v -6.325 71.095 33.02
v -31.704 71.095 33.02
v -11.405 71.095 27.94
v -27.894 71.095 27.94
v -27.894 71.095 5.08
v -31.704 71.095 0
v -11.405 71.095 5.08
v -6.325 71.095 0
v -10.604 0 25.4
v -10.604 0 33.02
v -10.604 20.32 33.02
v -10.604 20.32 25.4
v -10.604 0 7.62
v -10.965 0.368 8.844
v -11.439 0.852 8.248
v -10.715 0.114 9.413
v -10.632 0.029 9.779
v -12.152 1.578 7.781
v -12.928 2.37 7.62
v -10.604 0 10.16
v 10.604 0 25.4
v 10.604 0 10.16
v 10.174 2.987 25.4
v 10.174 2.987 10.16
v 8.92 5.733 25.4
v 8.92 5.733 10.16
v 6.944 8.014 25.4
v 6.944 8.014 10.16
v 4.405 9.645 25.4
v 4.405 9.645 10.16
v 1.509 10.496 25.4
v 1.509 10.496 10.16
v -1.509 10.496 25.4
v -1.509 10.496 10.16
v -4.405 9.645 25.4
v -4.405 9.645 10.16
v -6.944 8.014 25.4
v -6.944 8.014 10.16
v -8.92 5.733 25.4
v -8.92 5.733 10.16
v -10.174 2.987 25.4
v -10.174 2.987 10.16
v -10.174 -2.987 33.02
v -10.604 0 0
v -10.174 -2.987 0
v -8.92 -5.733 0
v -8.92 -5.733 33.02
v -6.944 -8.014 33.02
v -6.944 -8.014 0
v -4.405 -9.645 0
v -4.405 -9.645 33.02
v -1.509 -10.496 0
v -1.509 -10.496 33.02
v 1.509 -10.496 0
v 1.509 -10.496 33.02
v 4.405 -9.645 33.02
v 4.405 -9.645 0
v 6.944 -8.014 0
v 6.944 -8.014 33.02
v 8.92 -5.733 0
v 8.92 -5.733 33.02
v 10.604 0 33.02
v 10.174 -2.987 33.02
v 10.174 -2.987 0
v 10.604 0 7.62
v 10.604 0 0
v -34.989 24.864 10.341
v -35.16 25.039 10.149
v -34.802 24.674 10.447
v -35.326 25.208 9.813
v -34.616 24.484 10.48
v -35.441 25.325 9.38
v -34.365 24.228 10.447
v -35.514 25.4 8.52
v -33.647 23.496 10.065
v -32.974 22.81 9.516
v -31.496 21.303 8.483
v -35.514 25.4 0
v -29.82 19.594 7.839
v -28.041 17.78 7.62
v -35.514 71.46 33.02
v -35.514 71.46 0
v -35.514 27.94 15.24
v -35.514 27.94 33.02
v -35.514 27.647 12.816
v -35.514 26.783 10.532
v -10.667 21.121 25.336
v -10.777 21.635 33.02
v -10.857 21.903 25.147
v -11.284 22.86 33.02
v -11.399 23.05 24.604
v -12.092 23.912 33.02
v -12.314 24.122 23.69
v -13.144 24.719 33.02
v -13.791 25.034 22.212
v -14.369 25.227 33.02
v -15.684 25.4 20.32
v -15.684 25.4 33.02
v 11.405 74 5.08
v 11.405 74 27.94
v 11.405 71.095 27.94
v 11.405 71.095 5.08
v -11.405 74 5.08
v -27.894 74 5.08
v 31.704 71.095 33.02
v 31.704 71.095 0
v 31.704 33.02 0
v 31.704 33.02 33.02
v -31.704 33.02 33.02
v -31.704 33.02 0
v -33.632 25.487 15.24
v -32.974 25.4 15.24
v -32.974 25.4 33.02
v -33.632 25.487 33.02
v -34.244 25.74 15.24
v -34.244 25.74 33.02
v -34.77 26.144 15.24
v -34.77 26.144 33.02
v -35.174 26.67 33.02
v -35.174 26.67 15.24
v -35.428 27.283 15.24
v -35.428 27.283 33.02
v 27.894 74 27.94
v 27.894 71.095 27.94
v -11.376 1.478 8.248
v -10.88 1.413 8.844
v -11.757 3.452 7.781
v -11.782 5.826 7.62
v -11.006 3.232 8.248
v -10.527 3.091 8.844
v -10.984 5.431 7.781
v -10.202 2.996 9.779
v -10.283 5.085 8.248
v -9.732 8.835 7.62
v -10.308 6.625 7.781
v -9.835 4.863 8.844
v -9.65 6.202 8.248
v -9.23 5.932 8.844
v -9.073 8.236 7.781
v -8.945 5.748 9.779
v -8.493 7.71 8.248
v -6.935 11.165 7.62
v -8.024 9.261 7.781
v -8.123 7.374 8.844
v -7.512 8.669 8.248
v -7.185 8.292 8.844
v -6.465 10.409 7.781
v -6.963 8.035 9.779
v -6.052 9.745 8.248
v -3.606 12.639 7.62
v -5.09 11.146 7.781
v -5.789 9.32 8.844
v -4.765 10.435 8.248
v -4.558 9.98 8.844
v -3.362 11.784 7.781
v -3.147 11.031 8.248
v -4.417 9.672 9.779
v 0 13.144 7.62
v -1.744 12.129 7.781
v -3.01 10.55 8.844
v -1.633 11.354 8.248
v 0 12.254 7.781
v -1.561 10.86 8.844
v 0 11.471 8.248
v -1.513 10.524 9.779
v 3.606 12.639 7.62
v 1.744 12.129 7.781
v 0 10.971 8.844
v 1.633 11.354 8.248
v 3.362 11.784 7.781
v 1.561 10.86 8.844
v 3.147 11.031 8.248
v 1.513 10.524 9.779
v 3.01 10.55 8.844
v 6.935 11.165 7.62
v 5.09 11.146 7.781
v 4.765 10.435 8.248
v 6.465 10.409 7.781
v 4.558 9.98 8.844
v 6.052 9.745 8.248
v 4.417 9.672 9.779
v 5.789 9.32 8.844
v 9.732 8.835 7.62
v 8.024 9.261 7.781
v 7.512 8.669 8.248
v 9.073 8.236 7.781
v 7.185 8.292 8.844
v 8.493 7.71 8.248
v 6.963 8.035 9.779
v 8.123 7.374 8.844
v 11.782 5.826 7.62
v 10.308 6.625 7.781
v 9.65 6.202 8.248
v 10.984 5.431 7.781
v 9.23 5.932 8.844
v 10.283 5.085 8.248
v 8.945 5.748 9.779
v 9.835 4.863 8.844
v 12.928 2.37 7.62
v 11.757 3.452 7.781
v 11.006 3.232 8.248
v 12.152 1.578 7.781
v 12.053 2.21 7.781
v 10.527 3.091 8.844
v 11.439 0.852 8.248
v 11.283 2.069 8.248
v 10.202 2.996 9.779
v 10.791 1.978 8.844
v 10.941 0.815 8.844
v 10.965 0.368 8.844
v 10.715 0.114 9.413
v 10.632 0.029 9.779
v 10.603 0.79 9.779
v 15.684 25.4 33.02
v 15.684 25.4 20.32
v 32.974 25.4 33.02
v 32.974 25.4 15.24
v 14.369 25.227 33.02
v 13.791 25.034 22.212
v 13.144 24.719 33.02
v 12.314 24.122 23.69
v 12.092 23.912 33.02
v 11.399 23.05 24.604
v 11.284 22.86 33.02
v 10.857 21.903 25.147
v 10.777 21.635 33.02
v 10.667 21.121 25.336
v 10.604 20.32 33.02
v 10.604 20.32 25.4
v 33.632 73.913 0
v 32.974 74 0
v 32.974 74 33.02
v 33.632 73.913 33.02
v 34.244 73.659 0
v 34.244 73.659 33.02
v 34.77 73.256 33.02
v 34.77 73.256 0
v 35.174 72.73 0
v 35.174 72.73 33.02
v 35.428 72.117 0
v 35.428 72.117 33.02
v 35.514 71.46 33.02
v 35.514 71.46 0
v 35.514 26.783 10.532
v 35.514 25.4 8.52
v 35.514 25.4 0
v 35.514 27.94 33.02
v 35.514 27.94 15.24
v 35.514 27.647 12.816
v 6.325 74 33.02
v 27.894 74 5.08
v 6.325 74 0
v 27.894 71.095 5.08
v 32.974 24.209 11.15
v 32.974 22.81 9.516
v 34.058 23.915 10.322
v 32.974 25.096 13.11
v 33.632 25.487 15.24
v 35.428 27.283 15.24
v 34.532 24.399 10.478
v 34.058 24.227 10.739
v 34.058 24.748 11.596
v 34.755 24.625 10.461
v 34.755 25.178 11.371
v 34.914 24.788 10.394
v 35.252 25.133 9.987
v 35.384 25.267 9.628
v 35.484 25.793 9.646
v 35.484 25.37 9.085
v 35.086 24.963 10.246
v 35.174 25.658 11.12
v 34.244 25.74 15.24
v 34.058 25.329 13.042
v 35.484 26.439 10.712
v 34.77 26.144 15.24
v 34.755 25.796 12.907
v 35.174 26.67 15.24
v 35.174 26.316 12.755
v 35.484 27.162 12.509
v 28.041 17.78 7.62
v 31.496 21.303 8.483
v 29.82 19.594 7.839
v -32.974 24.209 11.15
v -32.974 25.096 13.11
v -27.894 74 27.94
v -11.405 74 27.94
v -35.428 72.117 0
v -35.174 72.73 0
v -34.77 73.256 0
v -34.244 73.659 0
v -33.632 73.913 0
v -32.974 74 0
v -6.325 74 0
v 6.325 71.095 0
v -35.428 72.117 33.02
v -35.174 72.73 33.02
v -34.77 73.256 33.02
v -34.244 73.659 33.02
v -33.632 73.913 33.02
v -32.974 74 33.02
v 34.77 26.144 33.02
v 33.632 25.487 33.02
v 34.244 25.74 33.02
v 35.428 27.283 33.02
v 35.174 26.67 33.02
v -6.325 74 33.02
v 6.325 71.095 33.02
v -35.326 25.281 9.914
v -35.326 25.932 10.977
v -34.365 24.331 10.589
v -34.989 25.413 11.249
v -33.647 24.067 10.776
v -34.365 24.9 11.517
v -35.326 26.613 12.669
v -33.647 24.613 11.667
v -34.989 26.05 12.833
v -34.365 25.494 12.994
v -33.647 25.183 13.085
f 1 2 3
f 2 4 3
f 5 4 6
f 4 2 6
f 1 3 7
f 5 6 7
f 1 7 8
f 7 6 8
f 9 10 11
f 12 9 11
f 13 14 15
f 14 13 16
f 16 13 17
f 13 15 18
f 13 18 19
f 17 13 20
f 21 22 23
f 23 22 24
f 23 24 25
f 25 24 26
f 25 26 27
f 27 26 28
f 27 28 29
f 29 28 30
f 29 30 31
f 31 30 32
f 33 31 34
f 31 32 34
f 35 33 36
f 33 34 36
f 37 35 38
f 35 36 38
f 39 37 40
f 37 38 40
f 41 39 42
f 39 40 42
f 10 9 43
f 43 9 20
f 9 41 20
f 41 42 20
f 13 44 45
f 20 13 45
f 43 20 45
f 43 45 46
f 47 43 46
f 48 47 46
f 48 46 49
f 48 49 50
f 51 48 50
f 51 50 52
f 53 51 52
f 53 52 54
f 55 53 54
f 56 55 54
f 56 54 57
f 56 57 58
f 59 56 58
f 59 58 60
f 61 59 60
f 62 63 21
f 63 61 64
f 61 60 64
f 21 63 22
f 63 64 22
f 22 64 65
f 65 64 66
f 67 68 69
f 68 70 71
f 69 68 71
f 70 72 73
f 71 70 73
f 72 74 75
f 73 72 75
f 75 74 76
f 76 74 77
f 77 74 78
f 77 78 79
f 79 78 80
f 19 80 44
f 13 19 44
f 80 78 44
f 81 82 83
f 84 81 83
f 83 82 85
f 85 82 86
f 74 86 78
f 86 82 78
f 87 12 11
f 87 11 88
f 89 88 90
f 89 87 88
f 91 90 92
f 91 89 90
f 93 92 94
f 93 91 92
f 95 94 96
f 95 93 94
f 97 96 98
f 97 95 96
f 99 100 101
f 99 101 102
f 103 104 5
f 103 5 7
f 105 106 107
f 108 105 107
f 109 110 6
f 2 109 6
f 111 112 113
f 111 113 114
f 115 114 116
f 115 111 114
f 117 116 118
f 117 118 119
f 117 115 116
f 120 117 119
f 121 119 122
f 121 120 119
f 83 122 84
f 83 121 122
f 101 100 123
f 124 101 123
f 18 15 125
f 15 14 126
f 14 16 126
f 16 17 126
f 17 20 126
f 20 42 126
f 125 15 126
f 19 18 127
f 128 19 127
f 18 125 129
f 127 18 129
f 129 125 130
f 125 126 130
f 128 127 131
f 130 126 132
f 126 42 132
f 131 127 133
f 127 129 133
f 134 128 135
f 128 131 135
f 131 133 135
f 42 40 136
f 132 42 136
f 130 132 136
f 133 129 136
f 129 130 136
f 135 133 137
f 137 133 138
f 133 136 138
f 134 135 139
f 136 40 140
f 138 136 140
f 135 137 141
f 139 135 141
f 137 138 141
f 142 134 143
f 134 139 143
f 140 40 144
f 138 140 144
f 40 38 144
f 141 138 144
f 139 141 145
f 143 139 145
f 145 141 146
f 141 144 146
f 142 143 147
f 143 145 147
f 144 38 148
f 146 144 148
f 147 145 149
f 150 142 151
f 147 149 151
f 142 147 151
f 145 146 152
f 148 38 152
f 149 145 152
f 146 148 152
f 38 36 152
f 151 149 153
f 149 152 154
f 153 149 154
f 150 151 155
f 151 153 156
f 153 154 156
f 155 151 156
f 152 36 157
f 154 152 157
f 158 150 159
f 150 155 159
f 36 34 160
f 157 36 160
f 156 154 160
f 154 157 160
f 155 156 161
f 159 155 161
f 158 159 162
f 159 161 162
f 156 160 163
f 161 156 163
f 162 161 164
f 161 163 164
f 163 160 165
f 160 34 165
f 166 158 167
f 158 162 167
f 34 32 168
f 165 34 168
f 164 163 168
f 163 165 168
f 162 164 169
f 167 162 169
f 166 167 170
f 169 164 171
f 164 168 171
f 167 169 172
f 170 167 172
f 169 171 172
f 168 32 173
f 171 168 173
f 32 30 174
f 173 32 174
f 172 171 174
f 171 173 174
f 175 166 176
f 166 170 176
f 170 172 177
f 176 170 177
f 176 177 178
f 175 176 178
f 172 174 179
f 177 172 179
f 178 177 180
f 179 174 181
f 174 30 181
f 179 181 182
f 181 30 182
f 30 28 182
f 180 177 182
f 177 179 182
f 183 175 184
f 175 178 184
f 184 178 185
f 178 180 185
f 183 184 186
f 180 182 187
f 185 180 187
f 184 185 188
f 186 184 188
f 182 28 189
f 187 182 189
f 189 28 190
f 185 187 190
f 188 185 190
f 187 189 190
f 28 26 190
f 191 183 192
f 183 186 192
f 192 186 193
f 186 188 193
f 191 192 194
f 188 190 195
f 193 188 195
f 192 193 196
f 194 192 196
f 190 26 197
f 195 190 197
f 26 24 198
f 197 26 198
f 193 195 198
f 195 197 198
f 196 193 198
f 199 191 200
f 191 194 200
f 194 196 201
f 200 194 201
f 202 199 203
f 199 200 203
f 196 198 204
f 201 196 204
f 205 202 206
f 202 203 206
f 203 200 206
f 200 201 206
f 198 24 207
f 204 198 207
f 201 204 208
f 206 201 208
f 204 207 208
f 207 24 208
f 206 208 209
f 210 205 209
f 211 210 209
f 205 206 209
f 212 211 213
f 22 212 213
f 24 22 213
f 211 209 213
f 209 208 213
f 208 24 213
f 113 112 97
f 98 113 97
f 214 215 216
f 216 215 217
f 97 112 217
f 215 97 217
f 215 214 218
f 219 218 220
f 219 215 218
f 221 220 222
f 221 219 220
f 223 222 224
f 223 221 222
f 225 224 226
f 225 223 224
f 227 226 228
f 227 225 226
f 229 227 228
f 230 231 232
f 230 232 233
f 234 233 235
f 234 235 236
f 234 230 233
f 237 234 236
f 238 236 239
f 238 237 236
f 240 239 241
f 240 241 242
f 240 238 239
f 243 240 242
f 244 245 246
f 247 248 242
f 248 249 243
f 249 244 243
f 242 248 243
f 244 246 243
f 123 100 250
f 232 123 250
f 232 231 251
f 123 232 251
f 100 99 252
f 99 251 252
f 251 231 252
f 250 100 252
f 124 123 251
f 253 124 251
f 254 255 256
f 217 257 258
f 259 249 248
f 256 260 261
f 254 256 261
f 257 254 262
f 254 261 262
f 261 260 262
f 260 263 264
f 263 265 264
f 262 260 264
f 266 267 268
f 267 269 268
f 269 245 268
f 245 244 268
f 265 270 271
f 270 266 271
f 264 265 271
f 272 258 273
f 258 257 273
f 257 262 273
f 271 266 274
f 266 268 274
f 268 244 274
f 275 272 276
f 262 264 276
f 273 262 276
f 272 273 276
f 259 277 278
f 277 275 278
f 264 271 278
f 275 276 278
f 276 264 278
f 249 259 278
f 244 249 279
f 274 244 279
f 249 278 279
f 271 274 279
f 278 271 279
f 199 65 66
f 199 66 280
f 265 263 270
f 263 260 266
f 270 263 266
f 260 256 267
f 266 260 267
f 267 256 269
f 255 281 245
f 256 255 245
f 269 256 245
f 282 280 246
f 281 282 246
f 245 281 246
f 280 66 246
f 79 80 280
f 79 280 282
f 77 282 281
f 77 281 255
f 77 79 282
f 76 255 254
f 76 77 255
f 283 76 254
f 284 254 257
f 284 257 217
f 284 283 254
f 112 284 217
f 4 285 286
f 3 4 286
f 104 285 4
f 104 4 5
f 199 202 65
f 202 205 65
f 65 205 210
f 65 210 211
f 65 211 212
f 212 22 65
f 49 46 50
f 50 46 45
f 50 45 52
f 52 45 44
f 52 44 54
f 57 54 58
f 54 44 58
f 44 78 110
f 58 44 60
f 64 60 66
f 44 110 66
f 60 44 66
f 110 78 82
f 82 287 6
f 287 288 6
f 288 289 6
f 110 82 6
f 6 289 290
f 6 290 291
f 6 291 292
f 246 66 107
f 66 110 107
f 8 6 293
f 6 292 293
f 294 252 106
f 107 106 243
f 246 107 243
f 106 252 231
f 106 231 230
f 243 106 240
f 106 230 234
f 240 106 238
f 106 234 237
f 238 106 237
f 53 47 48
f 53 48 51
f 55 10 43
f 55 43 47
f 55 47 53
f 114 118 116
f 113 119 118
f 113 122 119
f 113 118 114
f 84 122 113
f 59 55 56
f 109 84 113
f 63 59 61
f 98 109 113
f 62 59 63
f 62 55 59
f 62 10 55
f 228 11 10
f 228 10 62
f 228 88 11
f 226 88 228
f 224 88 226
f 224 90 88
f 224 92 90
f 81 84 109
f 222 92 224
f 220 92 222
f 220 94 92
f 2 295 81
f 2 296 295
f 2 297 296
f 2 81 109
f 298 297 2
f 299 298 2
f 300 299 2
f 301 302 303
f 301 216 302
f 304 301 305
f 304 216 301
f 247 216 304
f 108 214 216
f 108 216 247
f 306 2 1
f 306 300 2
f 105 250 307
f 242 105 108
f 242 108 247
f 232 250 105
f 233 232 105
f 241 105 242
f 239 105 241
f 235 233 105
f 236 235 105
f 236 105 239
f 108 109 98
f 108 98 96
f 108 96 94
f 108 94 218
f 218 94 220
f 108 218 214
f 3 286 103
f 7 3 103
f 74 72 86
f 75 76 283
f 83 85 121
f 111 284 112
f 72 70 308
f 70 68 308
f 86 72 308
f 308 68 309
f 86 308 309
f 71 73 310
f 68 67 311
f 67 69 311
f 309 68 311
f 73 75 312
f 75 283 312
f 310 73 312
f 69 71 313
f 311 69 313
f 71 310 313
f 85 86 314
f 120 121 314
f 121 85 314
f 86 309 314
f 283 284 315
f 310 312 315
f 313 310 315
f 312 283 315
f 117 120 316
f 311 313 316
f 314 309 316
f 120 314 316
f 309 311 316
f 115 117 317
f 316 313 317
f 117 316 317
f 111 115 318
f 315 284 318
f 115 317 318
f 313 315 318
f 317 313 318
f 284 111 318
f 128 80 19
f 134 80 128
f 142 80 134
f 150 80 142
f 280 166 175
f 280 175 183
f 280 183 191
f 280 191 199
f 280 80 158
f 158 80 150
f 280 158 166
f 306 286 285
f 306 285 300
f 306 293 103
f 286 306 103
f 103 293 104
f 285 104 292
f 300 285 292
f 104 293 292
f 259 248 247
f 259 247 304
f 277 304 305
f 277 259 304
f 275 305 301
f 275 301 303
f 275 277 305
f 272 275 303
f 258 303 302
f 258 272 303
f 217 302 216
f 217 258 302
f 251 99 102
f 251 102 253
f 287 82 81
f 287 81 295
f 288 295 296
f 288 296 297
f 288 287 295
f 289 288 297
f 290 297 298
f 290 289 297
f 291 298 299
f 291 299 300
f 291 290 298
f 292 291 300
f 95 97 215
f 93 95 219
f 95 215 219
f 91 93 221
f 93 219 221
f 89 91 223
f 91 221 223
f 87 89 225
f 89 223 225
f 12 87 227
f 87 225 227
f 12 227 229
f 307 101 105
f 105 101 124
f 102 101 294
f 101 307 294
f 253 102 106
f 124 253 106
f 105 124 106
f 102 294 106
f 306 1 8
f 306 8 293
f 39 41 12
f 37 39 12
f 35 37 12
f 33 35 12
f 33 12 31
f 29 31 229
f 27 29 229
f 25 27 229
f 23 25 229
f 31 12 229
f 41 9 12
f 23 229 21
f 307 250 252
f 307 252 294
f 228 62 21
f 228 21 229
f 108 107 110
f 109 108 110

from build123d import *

# Parameters (mm, degrees)
SKETCH1_R             = 10.603707514
BOSS_EXTRUDE1_DEPTH   = 33.02
BOSS_EXTRUDE1_2_DEPTH = 33.02
BOSS_EXTRUDE3_DEPTH   = 7.62
FILLET1_R             = 7.62
FILLET2_START         = 15.24
FILLET2_2_DEPTH       = 18.76
FILLET2_START_2       = -1
FILLET2_3_DEPTH       = 18.231506659
FILLET3_R             = 2.54
SKETCH6_W             = 16.48968
SKETCH6_H             = 22.86
CUT_EXTRUDE1_DEPTH    = 2.905181288
SKETCH7_W             = 21.207415028
SKETCH7_H             = 25.4
BOSS_EXTRUDE4_DEPTH   = 7.62
FILLET4_R             = 5.08


with BuildPart() as part:
    # Sketch1 → Boss-Extrude1 (new body)
    with BuildSketch(Plane.XY):
        Circle(SKETCH1_R)
    extrude(amount=BOSS_EXTRUDE1_DEPTH)



with BuildPart() as body_2:
    # Sketch1 → Boss-Extrude1 2 (new body)
    with BuildSketch(Plane.XY):
        Polygon((-35.51428, 73.999781288), (-35.51428, 25.4), (35.51428, 25.4), (35.51428, 73.999781288), (6.3246, 73.999781288), (6.3246, 71.0946), (31.70428, 71.0946), (31.70428, 33.02), (-31.70428, 33.02), (-31.70428, 71.0946), (-6.3246, 71.0946), (-6.3246, 73.999781288), align=None)
    extrude(amount=BOSS_EXTRUDE1_2_DEPTH)


with BuildPart() as part_1:
    add(part.part)

    add(body_2.part)  # Boss-Extrude3 merges body 2
    # Sketch3 → Boss-Extrude3 (add)
    with BuildSketch(Plane(origin=(0, 0, 0), x_dir=(-1, 0, 0), z_dir=(0, 0, -1))):
        with BuildLine():
            Line((-10.603707514, 0), (-35.51428, 25.4))
            Line((-35.51428, 25.4), (35.51428, 25.4))
            Line((35.51428, 25.4), (10.603707514, 0))
            ThreePointArc((10.603707514, 0), (0, -10.603707514), (-10.603707514, 0))
        make_face()
    extrude(amount=-BOSS_EXTRUDE3_DEPTH)

    # Fillet1
    fillet1_edges = [part_1.edges().sort_by_distance(p)[0] for p in [
        (0, 25.4, 7.62),
    ]]
    fillet(fillet1_edges, radius=FILLET1_R)

    # Fillet2: read off the stored shape, not the designer's step
    # Fillet2 outline → Fillet2 (revolve, cut)
    with BuildSketch(Plane(origin=(0, 17.78, 15.24), x_dir=(0, 1, 0), z_dir=(0, 0, -1))):
        with BuildLine():
            ThreePointArc((10.16, -35.51428), (8.363948776, -34.770331224), (7.62, -32.97428))
            Line((7.62, -32.97428), (7.62, -35.51428))
            Line((7.62, -35.51428), (10.16, -35.51428))
        make_face()
        with BuildLine():
            Line((7.62, 35.51428), (7.62, 32.97428))
            ThreePointArc((7.62, 32.97428), (8.363948776, 34.770331224), (10.16, 35.51428))
            Line((10.16, 35.51428), (7.62, 35.51428))
        make_face()
    revolve(axis=Axis((0, 17.78, 15.24), (1, 0, 0)), mode=Mode.SUBTRACT)

    # Fillet2 2 outline → Fillet2 2 (cut)
    with BuildSketch(Plane.XY.offset(FILLET2_START)):
        with BuildLine():
            Line((-35.51428, 73.999781288), (-35.51428, 71.459781288))
            ThreePointArc((-35.51428, 71.459781288), (-34.770331224, 73.255832512), (-32.97428, 73.999781288))
            Line((-32.97428, 73.999781288), (-35.51428, 73.999781288))
        make_face()
        with BuildLine():
            ThreePointArc((32.97428, 73.999781288), (34.770331224, 73.255832512), (35.51428, 71.459781288))
            Line((35.51428, 71.459781288), (35.51428, 73.999781288))
            Line((35.51428, 73.999781288), (32.97428, 73.999781288))
        make_face()
        with BuildLine():
            ThreePointArc((35.51428, 27.94), (34.770331224, 26.143948776), (32.97428, 25.4))
            Line((32.97428, 25.4), (35.51428, 25.4))
            Line((35.51428, 25.4), (35.51428, 27.94))
        make_face()
        with BuildLine():
            ThreePointArc((-32.97428, 25.4), (-34.770331224, 26.143948776), (-35.51428, 27.94))
            Line((-35.51428, 27.94), (-35.51428, 25.4))
            Line((-35.51428, 25.4), (-32.97428, 25.4))
        make_face()
    extrude(amount=FILLET2_2_DEPTH, mode=Mode.SUBTRACT)

    # Fillet2 3 outline → Fillet2 3 (cut)
    with BuildSketch(Plane.XY.offset(FILLET2_START_2)):
        with BuildLine():
            Line((-35.51428, 73.999781288), (-35.51428, 71.459781288))
            ThreePointArc((-35.51428, 71.459781288), (-34.770331224, 73.255832512), (-32.97428, 73.999781288))
            Line((-32.97428, 73.999781288), (-35.51428, 73.999781288))
        make_face()
        with BuildLine():
            ThreePointArc((32.97428, 73.999781288), (34.770331224, 73.255832512), (35.51428, 71.459781288))
            Line((35.51428, 71.459781288), (35.51428, 73.999781288))
            Line((35.51428, 73.999781288), (32.97428, 73.999781288))
        make_face()
    extrude(amount=FILLET2_3_DEPTH, mode=Mode.SUBTRACT)

    # Fillet3
    # the kernel refuses this fillet: 2.54 mm, written as the material it adds along each edge
    with BuildSketch(Plane(origin=(0, 0, 7.62), x_dir=(-0.8254427651523181, -0.5644858204221742, 0), z_dir=(0.5644858204221742, -0.8254427651523181, 0))) as fillet3_piece_1_section:
        with BuildLine():
            CenterArc((10.603707514 + FILLET3_R, -FILLET3_R), FILLET3_R, 90, 90)
            Line((10.603707514 + FILLET3_R, 0), (10.603707514, 0))
            Line((10.603707514, 0), (10.603707514, -FILLET3_R))
        make_face()
    fillet3_piece_1 = revolve(axis=Axis((0, 0, 7.62), (0, 0, -1)), revolution_arc=248.733186756, mode=Mode.PRIVATE)
    fillet3_piece_1 = split(fillet3_piece_1, bisect_by=Plane(origin=(5.404998183, -5.300850355, 7.62), z_dir=(-0.713951821892461, 0.7001948271848599, 0)), keep=Keep.TOP, mode=Mode.PRIVATE)
    fillet3_piece_1 = split(fillet3_piece_1, bisect_by=Plane(origin=(-5.404998183, -5.300850355, 7.62), z_dir=(0.713951821892461, 0.7001948271848599, 0)), keep=Keep.TOP, mode=Mode.PRIVATE)
    add(fillet3_piece_1)

    # Sketch6 → Cut-Extrude1 (cut)
    with BuildSketch(Plane(origin=(0, 73.999781288, 0), x_dir=(1, 0, 0), z_dir=(0, 1, 0))):
        with Locations((-19.64944, -16.51)):
            Rectangle(SKETCH6_W, SKETCH6_H)
        with Locations((19.64944, -16.51)):
            Rectangle(SKETCH6_W, SKETCH6_H)
    extrude(amount=-CUT_EXTRUDE1_DEPTH, mode=Mode.SUBTRACT)

    # Sketch7 → Boss-Extrude4 (add)
    with BuildSketch(Plane.XY.offset(33.02)):
        with Locations((0, 12.7)):
            Rectangle(SKETCH7_W, SKETCH7_H)
    extrude(amount=-BOSS_EXTRUDE4_DEPTH)

    # Fillet4
    fillet4_edges = [part_1.edges().sort_by_distance(p)[0] for p in [
        (0, 25.4, 25.4),
        (-10.603707514, 25.4, 29.21),
        (10.603707514, 25.4, 29.21),
    ]]
    fillet(fillet4_edges, radius=FILLET4_R)


solid = part_1.part
